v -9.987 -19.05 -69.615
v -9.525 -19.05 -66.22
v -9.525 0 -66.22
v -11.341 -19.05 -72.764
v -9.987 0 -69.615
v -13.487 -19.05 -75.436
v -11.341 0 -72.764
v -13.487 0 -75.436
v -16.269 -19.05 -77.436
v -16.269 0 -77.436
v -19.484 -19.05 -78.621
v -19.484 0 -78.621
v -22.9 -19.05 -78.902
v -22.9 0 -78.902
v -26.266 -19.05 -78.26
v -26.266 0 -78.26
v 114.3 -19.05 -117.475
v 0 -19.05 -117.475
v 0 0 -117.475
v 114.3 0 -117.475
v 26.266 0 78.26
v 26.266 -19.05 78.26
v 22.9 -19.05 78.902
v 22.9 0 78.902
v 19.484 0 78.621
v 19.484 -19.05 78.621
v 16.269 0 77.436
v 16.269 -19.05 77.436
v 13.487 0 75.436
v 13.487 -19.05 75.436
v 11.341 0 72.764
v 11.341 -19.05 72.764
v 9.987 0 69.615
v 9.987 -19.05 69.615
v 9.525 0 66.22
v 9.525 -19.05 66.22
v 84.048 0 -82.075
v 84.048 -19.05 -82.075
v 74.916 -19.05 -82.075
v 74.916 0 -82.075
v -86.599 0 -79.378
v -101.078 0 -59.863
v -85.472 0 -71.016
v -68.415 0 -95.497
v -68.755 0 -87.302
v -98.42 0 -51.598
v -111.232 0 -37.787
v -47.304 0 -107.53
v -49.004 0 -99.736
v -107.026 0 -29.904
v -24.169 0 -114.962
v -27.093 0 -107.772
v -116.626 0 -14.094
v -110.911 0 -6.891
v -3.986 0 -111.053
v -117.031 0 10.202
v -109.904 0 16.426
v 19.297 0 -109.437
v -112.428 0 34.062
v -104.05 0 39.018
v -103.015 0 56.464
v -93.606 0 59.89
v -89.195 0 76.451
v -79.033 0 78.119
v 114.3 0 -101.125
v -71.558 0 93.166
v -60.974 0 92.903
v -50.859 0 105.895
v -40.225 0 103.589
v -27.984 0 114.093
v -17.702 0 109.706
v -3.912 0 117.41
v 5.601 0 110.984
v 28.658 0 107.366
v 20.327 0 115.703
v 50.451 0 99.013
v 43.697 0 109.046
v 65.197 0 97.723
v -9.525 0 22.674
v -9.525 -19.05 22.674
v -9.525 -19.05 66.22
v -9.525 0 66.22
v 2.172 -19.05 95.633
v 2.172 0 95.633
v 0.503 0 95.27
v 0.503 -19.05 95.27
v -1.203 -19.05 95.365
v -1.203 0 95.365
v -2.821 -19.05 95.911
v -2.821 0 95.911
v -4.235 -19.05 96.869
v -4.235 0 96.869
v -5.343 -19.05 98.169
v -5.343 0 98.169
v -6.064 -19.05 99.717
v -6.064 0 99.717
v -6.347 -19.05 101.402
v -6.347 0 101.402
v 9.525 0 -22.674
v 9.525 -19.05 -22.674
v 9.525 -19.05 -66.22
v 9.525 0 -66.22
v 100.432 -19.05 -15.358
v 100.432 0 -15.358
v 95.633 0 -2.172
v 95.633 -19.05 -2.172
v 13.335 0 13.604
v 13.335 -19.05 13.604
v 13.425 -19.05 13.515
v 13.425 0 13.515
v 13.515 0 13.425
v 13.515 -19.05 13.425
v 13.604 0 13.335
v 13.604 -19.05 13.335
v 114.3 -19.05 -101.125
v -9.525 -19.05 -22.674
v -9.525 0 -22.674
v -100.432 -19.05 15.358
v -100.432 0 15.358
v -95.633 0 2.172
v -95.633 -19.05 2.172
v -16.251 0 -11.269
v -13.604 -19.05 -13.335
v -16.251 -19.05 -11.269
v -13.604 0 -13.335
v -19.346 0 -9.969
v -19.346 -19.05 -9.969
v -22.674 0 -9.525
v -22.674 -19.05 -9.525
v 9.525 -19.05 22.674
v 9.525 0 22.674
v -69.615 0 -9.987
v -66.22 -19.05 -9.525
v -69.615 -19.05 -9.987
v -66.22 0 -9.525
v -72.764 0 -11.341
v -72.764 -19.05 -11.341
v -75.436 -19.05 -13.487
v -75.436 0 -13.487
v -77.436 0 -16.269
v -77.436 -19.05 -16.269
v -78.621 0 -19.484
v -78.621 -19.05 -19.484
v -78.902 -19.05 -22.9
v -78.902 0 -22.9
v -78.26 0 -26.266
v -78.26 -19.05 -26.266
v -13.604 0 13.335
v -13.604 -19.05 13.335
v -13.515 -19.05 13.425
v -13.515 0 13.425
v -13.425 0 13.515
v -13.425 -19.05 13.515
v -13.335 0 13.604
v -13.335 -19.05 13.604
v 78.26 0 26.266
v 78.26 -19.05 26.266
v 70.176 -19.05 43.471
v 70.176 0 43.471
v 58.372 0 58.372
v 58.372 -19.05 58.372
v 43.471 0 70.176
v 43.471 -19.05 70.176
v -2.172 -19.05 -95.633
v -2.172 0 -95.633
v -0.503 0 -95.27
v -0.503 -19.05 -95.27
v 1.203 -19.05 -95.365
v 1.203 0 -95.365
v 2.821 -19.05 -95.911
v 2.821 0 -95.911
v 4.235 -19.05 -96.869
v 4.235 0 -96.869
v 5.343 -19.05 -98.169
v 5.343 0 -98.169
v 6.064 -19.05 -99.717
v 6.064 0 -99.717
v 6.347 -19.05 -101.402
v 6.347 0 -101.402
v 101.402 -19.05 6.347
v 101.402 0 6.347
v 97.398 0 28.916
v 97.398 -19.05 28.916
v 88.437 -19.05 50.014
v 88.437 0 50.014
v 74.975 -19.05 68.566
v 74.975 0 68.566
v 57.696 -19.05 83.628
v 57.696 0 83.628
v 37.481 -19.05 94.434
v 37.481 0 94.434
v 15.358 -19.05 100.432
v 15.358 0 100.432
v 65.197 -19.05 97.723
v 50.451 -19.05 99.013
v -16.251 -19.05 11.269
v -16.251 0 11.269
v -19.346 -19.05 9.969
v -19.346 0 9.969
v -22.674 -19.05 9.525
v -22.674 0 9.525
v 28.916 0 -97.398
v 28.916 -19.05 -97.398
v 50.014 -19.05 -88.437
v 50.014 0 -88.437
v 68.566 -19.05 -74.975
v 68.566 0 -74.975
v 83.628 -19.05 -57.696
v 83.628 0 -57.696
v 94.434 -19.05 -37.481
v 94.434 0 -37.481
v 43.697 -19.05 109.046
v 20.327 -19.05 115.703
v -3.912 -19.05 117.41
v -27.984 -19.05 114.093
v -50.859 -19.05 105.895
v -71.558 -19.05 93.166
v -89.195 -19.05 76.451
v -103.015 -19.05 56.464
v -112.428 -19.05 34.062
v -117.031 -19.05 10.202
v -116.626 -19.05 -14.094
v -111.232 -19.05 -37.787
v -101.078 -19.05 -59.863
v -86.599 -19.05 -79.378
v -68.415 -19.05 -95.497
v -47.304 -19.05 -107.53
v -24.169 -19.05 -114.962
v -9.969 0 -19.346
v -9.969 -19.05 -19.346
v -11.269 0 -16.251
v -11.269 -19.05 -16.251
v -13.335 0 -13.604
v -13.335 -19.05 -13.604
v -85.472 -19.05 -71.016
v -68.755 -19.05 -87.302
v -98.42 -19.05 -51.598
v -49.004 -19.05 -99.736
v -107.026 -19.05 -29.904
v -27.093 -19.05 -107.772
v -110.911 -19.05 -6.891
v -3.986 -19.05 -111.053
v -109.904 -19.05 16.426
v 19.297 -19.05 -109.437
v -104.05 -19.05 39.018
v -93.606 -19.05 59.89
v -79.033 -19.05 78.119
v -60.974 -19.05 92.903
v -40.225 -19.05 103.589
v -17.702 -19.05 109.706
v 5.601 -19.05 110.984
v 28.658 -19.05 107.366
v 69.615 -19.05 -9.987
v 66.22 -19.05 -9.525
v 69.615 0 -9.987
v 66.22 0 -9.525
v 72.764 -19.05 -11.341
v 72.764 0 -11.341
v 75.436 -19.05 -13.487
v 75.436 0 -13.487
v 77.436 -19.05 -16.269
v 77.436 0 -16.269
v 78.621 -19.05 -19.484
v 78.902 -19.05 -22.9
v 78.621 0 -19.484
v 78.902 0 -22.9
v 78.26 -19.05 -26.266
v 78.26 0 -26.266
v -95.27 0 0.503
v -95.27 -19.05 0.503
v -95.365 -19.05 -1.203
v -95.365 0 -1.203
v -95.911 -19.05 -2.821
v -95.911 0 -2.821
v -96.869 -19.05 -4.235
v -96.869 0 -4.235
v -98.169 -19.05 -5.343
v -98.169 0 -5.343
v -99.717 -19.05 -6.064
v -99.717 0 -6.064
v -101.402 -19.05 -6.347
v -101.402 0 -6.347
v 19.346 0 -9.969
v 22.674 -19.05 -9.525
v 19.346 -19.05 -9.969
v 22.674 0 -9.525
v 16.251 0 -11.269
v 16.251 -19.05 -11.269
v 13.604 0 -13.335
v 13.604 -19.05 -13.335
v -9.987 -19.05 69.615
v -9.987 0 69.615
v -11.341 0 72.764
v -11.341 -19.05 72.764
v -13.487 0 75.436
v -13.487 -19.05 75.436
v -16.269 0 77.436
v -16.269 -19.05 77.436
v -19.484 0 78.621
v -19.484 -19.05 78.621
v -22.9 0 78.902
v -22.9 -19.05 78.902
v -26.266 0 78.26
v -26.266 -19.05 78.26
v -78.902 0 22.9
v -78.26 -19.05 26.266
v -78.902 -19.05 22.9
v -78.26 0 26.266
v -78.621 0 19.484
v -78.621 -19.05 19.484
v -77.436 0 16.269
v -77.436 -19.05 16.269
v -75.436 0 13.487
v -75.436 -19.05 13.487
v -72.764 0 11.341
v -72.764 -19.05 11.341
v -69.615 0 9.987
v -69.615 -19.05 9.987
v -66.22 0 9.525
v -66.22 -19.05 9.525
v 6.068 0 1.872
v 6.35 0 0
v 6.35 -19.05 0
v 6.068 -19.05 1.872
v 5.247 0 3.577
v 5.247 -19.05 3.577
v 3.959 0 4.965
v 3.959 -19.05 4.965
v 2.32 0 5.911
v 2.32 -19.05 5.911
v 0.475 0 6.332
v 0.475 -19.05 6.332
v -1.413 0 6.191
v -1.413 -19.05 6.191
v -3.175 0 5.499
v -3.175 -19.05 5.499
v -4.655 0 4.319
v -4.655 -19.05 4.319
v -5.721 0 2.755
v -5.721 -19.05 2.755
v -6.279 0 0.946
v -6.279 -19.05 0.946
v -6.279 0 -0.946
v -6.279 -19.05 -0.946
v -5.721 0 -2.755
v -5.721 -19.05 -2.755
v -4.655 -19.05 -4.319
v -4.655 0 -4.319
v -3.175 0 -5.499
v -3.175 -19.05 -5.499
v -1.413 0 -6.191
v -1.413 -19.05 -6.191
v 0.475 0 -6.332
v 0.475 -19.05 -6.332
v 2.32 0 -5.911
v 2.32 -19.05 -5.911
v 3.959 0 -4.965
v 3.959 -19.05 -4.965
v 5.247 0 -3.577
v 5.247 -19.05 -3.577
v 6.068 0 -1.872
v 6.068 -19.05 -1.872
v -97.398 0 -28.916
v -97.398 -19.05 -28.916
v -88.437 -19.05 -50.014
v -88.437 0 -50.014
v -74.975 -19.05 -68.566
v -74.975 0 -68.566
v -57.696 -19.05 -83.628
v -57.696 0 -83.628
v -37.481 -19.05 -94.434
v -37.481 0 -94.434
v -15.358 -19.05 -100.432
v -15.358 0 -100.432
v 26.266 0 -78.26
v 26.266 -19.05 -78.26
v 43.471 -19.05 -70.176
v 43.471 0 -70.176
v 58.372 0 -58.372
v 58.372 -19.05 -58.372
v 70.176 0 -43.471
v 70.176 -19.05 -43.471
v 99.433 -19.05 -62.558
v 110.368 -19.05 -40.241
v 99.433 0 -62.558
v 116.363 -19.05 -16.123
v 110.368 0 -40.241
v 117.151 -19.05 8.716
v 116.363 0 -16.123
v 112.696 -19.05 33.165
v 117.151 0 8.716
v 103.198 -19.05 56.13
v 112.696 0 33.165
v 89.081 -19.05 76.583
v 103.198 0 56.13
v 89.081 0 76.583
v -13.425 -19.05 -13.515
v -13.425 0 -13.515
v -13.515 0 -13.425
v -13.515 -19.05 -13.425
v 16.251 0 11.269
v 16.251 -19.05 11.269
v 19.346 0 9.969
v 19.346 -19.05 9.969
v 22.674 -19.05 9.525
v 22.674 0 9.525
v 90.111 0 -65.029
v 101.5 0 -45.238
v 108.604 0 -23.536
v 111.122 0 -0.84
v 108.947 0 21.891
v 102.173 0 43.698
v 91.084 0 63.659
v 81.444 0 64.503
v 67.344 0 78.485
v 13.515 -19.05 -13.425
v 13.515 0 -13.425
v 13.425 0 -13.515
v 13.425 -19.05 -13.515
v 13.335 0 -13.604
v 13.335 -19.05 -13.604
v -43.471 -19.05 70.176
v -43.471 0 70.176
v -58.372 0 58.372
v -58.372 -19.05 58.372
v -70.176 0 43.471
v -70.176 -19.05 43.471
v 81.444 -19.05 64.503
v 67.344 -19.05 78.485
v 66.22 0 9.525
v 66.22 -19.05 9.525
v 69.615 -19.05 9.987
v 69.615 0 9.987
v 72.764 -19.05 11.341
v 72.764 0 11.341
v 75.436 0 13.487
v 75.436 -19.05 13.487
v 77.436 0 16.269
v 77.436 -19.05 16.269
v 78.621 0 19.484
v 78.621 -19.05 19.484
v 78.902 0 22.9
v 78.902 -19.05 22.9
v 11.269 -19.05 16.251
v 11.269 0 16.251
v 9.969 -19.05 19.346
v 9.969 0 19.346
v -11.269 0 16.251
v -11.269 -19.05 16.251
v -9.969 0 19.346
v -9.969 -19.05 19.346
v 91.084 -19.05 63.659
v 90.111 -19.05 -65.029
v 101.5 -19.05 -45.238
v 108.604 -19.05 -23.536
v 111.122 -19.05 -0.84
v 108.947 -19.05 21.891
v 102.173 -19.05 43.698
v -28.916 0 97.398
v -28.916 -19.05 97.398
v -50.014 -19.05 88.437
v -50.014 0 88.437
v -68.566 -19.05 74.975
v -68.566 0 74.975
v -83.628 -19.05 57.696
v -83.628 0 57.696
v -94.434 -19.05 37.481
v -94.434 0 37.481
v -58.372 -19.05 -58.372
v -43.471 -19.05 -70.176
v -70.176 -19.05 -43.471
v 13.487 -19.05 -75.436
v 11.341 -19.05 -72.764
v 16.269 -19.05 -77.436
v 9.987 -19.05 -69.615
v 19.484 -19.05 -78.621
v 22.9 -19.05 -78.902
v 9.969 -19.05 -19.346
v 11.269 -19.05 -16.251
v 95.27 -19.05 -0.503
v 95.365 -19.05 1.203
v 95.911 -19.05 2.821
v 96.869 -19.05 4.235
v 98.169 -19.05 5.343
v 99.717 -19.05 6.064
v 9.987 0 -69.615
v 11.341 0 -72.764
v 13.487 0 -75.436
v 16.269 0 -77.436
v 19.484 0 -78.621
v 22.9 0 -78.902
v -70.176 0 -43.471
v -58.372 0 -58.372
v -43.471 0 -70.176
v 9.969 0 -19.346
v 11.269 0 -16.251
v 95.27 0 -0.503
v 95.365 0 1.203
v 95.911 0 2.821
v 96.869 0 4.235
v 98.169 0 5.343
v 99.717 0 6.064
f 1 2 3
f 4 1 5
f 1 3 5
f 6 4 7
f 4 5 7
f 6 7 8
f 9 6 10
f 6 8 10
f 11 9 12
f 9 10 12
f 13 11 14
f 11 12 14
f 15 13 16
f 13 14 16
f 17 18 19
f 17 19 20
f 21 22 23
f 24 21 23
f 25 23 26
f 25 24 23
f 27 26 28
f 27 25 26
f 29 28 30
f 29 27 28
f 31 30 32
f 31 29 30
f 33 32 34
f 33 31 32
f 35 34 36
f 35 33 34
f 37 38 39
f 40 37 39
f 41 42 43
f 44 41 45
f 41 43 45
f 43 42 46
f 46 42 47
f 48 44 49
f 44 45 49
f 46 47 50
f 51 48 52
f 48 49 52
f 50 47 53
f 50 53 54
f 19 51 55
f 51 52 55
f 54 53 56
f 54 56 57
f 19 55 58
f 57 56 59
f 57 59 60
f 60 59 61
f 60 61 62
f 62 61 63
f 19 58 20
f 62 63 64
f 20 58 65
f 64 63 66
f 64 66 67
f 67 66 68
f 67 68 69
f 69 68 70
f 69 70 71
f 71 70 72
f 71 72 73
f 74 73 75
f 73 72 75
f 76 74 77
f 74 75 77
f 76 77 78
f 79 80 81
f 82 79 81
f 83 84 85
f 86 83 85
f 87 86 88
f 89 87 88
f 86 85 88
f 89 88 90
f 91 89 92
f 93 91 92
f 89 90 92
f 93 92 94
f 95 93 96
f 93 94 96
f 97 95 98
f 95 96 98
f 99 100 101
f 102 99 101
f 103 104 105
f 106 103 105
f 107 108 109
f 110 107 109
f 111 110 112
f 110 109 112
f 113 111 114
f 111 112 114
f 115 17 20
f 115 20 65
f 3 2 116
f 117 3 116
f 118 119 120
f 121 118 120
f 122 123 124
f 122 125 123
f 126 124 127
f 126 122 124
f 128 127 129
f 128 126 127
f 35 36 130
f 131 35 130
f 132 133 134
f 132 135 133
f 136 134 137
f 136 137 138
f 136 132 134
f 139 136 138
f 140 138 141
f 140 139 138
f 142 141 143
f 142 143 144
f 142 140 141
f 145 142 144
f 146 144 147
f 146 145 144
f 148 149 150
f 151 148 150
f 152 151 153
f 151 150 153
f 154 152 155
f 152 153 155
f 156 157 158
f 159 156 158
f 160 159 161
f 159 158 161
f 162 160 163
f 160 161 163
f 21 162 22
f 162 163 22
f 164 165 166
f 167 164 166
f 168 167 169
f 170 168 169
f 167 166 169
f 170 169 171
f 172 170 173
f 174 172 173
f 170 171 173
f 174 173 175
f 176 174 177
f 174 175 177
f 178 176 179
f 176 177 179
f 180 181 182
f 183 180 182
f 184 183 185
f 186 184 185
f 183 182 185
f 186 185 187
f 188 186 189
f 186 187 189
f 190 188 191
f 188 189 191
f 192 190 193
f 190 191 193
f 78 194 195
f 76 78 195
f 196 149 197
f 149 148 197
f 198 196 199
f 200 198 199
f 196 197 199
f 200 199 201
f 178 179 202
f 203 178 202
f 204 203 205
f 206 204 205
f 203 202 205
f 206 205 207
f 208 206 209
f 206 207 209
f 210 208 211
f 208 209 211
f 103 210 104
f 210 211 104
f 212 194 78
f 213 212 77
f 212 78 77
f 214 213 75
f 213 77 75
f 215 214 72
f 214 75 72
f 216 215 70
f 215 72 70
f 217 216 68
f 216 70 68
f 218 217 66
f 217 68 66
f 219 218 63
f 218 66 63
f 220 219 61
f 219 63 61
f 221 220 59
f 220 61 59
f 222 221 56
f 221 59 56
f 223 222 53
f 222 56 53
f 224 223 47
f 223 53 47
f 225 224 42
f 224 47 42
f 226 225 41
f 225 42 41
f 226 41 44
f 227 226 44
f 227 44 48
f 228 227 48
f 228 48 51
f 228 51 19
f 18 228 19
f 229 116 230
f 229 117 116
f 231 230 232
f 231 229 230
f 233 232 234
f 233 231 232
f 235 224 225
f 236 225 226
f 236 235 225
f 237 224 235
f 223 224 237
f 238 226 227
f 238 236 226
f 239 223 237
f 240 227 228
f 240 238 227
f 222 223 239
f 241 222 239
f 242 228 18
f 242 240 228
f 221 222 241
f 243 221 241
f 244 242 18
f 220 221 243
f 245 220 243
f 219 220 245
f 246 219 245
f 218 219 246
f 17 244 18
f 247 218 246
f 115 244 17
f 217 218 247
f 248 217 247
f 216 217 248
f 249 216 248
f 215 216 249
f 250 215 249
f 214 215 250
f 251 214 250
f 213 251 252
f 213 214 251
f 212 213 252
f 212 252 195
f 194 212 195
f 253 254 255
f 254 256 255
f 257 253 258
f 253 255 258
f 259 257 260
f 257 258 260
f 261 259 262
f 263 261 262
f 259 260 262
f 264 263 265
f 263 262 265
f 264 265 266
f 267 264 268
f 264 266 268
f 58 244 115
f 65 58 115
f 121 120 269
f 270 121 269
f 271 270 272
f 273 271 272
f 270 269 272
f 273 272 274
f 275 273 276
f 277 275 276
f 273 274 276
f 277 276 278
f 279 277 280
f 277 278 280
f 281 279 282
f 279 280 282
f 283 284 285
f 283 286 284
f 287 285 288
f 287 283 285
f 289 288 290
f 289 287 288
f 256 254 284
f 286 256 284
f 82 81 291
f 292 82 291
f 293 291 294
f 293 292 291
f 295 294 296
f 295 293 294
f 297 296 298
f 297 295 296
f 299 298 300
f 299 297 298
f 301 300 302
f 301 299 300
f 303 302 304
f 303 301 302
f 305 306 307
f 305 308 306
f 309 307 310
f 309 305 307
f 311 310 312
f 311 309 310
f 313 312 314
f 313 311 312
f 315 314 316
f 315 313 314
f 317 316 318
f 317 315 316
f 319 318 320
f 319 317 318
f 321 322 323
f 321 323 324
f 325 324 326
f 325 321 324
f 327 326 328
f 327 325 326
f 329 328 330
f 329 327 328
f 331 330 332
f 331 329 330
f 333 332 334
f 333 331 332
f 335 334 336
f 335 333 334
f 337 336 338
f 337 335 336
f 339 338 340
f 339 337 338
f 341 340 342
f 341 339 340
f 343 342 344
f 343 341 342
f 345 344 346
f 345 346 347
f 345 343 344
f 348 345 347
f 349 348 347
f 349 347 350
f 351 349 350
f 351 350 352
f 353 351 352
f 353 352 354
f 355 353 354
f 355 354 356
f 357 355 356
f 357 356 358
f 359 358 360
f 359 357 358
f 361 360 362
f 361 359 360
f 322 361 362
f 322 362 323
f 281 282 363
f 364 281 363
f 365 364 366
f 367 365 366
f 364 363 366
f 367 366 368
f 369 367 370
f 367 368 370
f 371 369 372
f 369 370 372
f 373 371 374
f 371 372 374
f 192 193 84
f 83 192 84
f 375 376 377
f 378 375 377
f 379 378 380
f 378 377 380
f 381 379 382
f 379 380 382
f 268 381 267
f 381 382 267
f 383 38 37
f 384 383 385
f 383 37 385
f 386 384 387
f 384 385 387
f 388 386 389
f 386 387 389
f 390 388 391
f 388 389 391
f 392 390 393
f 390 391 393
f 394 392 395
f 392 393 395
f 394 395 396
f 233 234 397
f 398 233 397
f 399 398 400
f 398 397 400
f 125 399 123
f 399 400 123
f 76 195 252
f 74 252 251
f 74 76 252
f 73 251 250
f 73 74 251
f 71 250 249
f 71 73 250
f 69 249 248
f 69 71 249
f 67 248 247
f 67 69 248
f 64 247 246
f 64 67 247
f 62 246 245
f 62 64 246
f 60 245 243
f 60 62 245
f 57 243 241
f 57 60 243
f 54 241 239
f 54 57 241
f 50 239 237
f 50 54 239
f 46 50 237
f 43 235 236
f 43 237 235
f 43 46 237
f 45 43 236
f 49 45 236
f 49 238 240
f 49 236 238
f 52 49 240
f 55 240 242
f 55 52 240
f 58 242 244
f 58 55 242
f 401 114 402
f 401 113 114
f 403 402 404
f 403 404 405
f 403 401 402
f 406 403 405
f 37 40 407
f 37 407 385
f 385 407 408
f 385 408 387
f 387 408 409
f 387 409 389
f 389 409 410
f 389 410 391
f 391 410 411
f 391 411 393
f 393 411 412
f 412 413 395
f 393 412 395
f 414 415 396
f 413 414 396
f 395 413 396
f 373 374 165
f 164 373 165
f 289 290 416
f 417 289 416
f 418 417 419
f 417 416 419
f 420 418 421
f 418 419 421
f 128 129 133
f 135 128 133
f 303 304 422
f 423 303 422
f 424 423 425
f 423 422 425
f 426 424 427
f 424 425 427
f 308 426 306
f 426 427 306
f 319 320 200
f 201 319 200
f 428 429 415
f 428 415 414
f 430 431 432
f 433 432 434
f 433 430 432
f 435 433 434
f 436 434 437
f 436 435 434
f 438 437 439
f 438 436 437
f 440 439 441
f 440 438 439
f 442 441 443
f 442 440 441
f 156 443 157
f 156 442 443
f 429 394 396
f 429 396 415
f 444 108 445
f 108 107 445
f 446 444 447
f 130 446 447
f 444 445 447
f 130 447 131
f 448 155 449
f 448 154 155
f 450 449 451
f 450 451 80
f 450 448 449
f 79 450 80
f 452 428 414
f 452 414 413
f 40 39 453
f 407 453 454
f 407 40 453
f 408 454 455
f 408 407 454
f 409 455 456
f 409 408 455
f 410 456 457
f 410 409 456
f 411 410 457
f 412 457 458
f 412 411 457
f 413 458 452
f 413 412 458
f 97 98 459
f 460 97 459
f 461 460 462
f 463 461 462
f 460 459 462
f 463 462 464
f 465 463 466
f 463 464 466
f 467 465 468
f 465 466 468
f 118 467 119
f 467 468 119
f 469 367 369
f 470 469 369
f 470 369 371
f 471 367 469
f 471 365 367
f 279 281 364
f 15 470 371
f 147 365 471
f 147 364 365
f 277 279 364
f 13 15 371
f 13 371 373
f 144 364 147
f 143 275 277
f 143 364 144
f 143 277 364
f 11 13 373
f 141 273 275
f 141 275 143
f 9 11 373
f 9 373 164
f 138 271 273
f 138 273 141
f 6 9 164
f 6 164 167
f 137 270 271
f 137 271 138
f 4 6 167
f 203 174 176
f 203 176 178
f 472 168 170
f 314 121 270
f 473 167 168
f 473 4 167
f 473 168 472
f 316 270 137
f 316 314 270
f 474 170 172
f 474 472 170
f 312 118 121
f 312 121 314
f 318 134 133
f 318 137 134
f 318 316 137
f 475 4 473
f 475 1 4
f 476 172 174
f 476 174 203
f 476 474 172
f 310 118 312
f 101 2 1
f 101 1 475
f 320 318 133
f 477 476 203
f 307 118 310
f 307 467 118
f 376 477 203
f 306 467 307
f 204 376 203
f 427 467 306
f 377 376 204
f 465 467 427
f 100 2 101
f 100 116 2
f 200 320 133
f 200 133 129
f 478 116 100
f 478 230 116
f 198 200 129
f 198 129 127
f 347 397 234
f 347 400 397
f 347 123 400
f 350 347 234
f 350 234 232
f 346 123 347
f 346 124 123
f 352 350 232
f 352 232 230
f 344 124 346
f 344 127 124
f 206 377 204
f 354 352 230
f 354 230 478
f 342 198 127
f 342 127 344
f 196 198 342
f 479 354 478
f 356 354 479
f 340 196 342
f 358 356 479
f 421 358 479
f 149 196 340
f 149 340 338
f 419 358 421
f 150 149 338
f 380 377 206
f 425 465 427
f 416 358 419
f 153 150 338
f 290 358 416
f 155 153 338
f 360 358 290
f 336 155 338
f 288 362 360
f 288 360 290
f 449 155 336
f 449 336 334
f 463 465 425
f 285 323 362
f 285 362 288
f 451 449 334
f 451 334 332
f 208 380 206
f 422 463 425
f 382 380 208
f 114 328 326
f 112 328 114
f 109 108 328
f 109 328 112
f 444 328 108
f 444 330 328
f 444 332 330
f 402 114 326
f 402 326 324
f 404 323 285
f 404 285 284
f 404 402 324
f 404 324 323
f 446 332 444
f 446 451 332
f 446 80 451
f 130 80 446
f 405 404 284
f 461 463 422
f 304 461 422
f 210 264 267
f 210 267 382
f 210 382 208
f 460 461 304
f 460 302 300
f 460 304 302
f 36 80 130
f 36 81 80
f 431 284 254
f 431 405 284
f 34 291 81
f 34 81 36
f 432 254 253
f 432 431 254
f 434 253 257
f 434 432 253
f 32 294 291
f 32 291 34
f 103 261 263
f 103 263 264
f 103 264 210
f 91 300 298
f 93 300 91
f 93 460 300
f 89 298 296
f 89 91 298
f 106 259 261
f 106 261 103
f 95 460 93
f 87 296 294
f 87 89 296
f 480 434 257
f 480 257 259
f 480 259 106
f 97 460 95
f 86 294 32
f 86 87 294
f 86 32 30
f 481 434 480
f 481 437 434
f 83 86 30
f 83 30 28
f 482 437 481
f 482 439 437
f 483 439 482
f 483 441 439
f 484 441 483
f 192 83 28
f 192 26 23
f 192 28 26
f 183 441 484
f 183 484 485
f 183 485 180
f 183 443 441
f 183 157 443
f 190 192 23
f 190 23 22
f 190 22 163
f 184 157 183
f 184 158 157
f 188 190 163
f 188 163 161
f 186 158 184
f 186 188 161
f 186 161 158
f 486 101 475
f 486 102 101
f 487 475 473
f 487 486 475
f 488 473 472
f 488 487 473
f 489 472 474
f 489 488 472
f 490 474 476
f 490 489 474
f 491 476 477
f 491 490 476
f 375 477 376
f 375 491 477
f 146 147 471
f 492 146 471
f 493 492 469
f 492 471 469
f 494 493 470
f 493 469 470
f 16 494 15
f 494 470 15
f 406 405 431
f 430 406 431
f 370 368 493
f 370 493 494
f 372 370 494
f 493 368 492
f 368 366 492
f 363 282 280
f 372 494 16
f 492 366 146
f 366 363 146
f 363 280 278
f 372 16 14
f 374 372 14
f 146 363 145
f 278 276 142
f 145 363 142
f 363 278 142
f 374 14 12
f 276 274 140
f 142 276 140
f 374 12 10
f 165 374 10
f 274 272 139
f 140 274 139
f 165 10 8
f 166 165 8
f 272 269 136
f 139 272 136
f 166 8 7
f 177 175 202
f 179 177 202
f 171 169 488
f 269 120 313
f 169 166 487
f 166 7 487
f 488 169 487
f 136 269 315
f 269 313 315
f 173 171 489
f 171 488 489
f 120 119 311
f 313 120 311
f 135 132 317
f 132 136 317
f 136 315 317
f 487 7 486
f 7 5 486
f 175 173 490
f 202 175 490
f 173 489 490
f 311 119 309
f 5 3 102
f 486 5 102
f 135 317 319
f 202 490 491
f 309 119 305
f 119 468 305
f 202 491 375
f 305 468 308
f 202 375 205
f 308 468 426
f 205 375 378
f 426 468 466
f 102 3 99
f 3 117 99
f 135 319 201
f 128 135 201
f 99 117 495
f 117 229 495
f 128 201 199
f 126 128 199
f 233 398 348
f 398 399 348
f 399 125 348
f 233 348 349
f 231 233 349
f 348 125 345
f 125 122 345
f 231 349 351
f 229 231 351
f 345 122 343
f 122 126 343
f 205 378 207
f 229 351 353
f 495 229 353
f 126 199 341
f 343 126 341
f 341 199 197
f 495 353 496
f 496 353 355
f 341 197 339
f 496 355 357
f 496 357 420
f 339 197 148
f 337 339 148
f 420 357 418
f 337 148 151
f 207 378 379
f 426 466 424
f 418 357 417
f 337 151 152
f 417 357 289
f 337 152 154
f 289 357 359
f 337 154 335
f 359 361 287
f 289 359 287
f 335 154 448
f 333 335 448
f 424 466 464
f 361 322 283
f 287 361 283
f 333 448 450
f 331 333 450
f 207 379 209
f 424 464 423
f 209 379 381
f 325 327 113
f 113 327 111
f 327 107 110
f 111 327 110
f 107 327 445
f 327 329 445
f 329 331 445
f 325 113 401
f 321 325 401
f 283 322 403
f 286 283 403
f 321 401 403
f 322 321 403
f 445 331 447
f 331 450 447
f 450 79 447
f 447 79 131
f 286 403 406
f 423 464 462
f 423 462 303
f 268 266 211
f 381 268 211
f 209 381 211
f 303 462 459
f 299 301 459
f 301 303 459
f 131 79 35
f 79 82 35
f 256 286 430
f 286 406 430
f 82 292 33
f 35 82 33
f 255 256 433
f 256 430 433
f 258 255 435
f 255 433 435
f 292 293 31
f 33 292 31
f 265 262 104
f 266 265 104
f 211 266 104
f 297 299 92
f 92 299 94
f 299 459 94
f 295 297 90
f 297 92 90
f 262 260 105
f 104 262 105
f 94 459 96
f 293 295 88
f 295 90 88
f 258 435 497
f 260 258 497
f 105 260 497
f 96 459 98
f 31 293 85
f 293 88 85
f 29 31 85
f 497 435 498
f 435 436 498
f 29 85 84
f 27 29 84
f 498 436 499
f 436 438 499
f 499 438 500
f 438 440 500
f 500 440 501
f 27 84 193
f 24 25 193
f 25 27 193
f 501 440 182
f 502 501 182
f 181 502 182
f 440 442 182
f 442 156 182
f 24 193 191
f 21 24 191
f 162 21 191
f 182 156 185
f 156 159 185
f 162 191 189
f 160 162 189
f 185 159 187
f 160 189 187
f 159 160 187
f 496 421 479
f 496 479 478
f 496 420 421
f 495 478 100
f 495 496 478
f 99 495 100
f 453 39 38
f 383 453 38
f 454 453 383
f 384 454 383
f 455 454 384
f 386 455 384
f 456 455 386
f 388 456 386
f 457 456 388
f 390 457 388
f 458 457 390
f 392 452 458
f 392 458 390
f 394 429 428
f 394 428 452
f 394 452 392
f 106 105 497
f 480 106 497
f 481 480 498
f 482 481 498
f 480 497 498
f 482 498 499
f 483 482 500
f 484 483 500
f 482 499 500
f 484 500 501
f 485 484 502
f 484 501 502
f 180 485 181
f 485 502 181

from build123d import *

# Parameters (mm, degrees)
F0_R      = 6.35
F1_DEPTH  = 19.05
F3_DEPTH  = 19.05
F4_R      = 12.7
F5_R      = 117.475
F5_R_2    = 111.125
F6_DEPTH  = 19.05
F8_DEPTH  = 19.05
F9_DEPTH  = 19.05
F11_DEPTH = 19.05
F12_DEPTH = 25.4


with BuildPart() as f1:
    # F0 (on Front) → F1 (new body)
    with BuildSketch(Plane.XZ):
        with BuildLine():
            ThreePointArc((2.1718279101, 95.632951858), (-3.5604804619, 96.3421031885), (-6.3468986567, 101.4015625))
            ThreePointArc((-6.3468986567, 101.4015625), (-68.5661384352, 74.9749602207), (-100.4324652793, 15.3583826596))
            Line((-100.4324652793, 15.3583826596), (-95.632951858, 2.1718279101))
            ThreePointArc((-95.632951858, 2.1718279101), (-96.3421031885, -3.5604804619), (-101.4015625, -6.3468986567))
            ThreePointArc((-101.4015625, -6.3468986567), (-74.9749602207, -68.5661384352), (-15.3583826596, -100.4324652793))
            Line((-15.3583826596, -100.4324652793), (-2.1718279101, -95.632951858))
            ThreePointArc((-2.1718279101, -95.632951858), (3.5604804619, -96.3421031885), (6.3468986567, -101.4015625))
            ThreePointArc((6.3468986567, -101.4015625), (68.5661384352, -74.9749602207), (100.4324652793, -15.3583826596))
            Line((100.4324652793, -15.3583826596), (95.632951858, -2.1718279101))
            ThreePointArc((95.632951858, -2.1718279101), (96.3421031885, 3.5604804619), (101.4015625, 6.3468986567))
            ThreePointArc((101.4015625, 6.3468986567), (74.9749602207, 68.5661384352), (15.3583826596, 100.4324652793))
            Line((15.3583826596, 100.4324652793), (2.1718279101, 95.632951858))
        make_face()
        Circle(F0_R, mode=Mode.SUBTRACT)
    extrude(amount=F1_DEPTH)

    # F2 (on face) → F3 (cut)
    with BuildSketch(Plane.XZ.offset(19.05)):
        with BuildLine():
            ThreePointArc((9.525, 16.4977839421), (13.4703841816, 13.4703841816), (16.4977839421, 9.525))
            Line((16.4977839421, 9.525), (81.9986394704, 9.525))
            ThreePointArc((81.9986394704, 9.525), (58.3716647869, 58.3716647869), (9.525, 81.9986394704))
            Line((9.525, 81.9986394704), (9.525, 16.4977839421))
        make_face()
        with BuildLine():
            ThreePointArc((-16.4977839421, 9.525), (-13.4703841816, 13.4703841816), (-9.525, 16.4977839421))
            Line((-9.525, 16.4977839421), (-9.525, 81.9986394704))
            ThreePointArc((-9.525, 81.9986394704), (-58.3716647869, 58.3716647869), (-81.9986394704, 9.525))
            Line((-81.9986394704, 9.525), (-16.4977839421, 9.525))
        make_face()
        with BuildLine():
            Line((-9.525, -81.9986394704), (-9.525, -16.4977839421))
            ThreePointArc((-9.525, -16.4977839421), (-13.4703841816, -13.4703841816), (-16.4977839421, -9.525))
            Line((-16.4977839421, -9.525), (-81.9986394704, -9.525))
            ThreePointArc((-81.9986394704, -9.525), (-58.3716647869, -58.3716647869), (-9.525, -81.9986394704))
        make_face()
        with BuildLine():
            Line((81.9986394704, -9.525), (16.4977839421, -9.525))
            ThreePointArc((16.4977839421, -9.525), (13.4703841816, -13.4703841816), (9.525, -16.4977839421))
            Line((9.525, -16.4977839421), (9.525, -81.9986394704))
            ThreePointArc((9.525, -81.9986394704), (58.3716647869, -58.3716647869), (81.9986394704, -9.525))
        make_face()
    extrude(amount=-F3_DEPTH, mode=Mode.SUBTRACT)

    # F4
    f4_edges = [f1.edges().sort_by_distance(p)[0] for p in [
        (-9.525, -9.525, 81.998639),
        (-81.998639, -9.525, 9.525),
        (-9.525, -9.525, 16.497784),
        (-16.497784, -9.525, 9.525),
        (81.998639, -9.525, -9.525),
        (9.525, -9.525, 81.998639),
        (9.525, -9.525, 16.497784),
        (16.497784, -9.525, -9.525),
        (16.497784, -9.525, 9.525),
        (81.998639, -9.525, 9.525),
        (9.525, -9.525, -81.998639),
        (9.525, -9.525, -16.497784),
        (-9.525, -9.525, -16.497784),
        (-16.497784, -9.525, -9.525),
        (-81.998639, -9.525, -9.525),
        (-9.525, -9.525, -81.998639),
    ]]
    fillet(f4_edges, radius=F4_R)


with BuildPart() as f6:
    # F5 (on Front) → F6 (new body)
    with BuildSketch(Plane.XZ):
        Circle(F5_R)
        Circle(F5_R_2, mode=Mode.SUBTRACT)
    extrude(amount=F6_DEPTH)

    # F7 (on face) → F8 (join)
    with BuildSketch(Plane.XZ.offset(19.05)):
        with BuildLine():
            ThreePointArc((48.810471892, -106.8546370481), (24.9762601061, -114.7892070541), (0, -117.475))
            Line((0, -117.475), (114.3, -117.475))
            Line((114.3, -117.475), (114.3, -101.125045759))
            Line((114.3, -101.125045759), (48.810471892, -106.8546370481))
        make_face()
    extrude(amount=-F8_DEPTH)

    # F7 (on face) → F9 (cut)
    with BuildSketch(Plane.XZ.offset(19.05)):
        with BuildLine():
            ThreePointArc((74.9163032234, -82.075045759), (49.0528917385, -99.7124838578), (19.2966537432, -109.4367615535))
            Line((19.2966537432, -109.4367615535), (48.810471892, -106.8546370481))
            ThreePointArc((48.810471892, -106.8546370481), (67.5747653841, -96.0938432382), (84.0479773026, -82.075045759))
            Line((84.0479773026, -82.075045759), (74.9163032234, -82.075045759))
        make_face()
    extrude(amount=-F9_DEPTH, mode=Mode.SUBTRACT)

    # F10 (on face) → F11 (join)
    with BuildSketch(Plane.XZ.offset(19.05)):
        Polygon((89.0810143056, 76.582951858), (67.343899207, 78.4847030069), (81.4441892706, 64.5025755371), (91.0838634658, 63.6592133249), align=None)
    extrude(amount=-F11_DEPTH)

    # F10 (on face) → F12 (cut)
    with BuildSketch(Plane.XZ.offset(19.05)):
        Polygon((50.4505131202, 99.0126827781), (64.1809810406, 78.7614224901), (67.343899207, 78.4847030069), (89.0810143056, 76.582951858), (89.0810143056, 95.632951858), align=None)
    extrude(amount=-F12_DEPTH, mode=Mode.SUBTRACT)


solid = Compound([f1.part, f6.part])
